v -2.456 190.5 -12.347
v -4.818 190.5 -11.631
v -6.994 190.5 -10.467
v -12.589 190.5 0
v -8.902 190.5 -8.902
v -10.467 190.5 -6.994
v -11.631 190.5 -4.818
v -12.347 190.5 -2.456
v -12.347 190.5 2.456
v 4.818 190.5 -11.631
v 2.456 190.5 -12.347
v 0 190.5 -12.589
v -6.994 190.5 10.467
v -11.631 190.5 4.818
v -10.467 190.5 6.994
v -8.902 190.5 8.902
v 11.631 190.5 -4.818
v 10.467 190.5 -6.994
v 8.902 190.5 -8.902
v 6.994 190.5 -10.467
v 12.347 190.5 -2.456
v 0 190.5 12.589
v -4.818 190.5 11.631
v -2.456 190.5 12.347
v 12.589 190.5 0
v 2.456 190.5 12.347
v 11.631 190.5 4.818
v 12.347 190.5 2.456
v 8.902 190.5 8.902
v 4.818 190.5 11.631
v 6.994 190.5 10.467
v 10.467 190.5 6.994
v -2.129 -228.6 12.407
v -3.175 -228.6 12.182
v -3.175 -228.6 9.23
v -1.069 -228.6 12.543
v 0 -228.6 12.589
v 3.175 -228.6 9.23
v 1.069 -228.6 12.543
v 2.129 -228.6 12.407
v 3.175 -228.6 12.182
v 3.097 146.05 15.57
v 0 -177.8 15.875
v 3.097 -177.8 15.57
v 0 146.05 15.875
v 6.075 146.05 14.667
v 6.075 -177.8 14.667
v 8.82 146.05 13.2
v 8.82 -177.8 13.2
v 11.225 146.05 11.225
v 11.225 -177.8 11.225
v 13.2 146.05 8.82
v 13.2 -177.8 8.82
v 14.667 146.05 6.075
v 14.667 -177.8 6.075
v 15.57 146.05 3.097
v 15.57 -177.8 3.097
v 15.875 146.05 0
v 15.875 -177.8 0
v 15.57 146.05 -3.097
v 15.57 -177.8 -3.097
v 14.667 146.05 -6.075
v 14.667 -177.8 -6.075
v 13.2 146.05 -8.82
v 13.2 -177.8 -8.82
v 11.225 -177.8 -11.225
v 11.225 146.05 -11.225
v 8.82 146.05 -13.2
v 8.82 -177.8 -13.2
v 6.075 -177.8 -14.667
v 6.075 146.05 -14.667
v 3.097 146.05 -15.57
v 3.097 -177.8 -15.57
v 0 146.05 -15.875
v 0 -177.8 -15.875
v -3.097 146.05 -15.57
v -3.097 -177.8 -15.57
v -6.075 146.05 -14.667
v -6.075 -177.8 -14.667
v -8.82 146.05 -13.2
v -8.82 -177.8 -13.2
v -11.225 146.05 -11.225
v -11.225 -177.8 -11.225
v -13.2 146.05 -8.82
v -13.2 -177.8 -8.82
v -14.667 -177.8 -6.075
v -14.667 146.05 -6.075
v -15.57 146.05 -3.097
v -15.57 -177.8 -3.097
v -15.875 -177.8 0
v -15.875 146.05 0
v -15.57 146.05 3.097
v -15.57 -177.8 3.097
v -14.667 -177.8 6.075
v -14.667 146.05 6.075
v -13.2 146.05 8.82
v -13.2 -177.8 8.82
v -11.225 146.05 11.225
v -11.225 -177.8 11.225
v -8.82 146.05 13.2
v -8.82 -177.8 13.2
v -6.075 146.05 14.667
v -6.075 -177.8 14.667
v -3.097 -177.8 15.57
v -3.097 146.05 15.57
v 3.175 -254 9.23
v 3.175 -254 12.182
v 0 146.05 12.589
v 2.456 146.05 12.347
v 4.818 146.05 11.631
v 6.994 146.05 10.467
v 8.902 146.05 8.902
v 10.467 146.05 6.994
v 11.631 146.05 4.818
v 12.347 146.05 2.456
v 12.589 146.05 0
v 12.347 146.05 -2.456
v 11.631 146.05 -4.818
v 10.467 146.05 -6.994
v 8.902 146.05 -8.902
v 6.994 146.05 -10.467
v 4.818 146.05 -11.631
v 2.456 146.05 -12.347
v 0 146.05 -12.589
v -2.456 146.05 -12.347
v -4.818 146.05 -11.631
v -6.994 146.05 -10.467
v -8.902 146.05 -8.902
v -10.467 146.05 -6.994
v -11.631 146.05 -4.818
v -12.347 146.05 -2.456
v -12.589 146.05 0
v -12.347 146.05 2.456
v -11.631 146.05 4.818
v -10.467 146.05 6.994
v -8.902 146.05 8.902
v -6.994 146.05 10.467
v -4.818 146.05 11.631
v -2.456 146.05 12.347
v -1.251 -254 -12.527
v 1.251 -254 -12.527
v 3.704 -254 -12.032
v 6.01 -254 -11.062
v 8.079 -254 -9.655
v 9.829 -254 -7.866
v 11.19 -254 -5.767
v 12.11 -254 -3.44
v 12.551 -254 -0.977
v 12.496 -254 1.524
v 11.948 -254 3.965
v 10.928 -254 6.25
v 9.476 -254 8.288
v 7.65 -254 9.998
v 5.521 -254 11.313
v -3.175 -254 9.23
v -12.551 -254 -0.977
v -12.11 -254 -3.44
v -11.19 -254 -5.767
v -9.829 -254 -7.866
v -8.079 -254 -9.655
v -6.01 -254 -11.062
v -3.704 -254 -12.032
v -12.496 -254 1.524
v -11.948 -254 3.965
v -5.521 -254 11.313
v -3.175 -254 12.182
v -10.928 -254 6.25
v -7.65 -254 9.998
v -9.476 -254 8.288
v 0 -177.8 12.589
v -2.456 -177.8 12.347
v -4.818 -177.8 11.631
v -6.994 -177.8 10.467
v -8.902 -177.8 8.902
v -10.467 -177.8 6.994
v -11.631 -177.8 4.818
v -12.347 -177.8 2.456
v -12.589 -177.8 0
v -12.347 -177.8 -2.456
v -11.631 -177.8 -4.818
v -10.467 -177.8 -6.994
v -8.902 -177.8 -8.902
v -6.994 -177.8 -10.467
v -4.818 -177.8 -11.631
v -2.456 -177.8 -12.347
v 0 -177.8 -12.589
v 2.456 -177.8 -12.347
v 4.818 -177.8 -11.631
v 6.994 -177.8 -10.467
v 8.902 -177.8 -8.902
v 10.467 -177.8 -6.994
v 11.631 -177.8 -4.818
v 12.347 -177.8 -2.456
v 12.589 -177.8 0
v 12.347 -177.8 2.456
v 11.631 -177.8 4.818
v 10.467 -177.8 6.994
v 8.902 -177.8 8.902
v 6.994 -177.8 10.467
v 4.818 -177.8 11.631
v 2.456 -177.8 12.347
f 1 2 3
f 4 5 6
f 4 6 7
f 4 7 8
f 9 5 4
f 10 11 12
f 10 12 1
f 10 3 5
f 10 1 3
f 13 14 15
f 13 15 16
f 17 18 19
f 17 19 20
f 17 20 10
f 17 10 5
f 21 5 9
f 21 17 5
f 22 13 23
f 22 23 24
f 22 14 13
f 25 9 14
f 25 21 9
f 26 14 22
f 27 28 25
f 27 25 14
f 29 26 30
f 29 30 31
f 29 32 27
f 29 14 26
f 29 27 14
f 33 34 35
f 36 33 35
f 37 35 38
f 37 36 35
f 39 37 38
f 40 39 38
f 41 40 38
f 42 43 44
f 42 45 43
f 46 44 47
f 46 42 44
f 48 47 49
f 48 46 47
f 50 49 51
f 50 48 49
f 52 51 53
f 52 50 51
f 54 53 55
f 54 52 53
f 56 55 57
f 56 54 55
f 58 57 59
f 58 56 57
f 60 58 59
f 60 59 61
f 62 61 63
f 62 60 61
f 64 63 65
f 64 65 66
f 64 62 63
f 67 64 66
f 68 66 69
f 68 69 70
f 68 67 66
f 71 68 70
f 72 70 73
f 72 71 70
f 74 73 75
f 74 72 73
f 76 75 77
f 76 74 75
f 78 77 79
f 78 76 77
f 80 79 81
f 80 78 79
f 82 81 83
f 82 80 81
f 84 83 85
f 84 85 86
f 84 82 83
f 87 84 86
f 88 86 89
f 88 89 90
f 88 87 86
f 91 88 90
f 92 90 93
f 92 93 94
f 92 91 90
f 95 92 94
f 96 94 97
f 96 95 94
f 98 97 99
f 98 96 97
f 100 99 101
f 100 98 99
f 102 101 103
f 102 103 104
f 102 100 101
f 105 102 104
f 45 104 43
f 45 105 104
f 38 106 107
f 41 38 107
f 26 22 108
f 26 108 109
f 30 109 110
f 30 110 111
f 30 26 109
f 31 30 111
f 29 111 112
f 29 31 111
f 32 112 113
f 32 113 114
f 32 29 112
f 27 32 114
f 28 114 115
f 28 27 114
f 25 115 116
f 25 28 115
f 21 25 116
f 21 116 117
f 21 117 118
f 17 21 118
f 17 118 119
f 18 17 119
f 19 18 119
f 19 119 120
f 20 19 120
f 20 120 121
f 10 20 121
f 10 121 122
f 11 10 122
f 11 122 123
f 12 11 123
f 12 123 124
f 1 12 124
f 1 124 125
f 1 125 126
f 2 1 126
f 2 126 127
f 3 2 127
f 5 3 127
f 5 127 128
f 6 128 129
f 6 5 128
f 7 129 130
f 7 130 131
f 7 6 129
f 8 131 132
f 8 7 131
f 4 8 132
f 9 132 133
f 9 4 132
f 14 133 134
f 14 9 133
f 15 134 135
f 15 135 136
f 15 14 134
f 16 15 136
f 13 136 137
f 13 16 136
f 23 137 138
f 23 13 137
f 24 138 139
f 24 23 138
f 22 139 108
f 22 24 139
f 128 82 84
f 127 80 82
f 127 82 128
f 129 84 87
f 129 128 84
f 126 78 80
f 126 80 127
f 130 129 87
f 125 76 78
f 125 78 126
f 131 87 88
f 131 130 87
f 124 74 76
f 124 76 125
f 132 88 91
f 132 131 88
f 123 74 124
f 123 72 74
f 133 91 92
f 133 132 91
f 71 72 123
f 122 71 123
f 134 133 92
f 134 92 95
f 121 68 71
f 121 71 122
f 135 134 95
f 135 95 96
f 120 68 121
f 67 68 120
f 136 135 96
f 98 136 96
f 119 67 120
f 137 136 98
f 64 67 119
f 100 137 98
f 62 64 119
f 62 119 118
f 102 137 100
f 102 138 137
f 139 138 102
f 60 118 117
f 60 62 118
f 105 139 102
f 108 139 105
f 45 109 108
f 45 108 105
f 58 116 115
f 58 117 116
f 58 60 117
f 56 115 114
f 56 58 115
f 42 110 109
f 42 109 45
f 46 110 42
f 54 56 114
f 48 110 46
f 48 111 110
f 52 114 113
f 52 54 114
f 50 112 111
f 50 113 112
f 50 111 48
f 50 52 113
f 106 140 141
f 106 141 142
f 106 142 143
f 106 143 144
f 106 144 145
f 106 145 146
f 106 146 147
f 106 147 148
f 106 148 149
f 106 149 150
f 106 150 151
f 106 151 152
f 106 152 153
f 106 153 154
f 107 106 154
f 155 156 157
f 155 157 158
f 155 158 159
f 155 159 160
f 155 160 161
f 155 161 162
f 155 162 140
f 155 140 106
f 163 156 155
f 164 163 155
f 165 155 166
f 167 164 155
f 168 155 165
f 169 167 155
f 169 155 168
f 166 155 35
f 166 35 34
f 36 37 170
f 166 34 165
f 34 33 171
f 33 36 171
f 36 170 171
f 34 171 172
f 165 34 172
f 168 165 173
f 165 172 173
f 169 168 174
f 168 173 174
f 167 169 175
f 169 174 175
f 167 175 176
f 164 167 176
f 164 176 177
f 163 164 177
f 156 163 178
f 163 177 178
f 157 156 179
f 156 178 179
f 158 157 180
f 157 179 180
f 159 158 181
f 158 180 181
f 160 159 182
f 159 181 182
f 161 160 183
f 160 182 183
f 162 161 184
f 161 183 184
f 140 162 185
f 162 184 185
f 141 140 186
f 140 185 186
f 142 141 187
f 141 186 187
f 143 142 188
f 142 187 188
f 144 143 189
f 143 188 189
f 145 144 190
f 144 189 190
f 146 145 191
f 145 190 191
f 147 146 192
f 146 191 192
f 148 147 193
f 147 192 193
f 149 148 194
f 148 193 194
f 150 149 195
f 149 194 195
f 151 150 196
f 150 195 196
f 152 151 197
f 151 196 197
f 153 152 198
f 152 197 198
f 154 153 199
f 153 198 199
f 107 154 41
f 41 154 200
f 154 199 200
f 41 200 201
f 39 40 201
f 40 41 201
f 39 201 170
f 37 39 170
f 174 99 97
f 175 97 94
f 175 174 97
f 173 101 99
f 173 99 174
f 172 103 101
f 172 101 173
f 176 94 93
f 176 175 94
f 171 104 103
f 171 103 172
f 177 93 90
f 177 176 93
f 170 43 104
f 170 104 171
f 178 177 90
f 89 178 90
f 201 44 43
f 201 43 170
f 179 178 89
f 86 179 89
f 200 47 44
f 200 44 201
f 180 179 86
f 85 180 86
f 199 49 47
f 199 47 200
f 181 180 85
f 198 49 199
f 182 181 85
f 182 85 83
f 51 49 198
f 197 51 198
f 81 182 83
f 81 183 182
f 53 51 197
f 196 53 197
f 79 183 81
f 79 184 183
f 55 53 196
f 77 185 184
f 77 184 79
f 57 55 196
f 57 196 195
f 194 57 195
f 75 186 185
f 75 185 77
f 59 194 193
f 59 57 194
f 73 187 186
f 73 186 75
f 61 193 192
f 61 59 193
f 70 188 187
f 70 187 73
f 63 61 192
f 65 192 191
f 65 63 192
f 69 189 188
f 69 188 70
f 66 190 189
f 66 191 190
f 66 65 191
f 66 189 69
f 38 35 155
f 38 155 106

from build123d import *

# Parameters (mm, degrees)
SKETCH1_R           = 15.875
BOSS_EXTRUDE1_DEPTH = 215.9
SKETCH4_R           = 15.875
SKETCH4_R_2         = 12.588875
CUT_EXTRUDE3_DEPTH  = 69.85
CUT_EXTRUDE4_START  = -38.1
SKETCH5_R           = 15.875
SKETCH5_R_2         = 12.588875
CUT_EXTRUDE4_DEPTH  = 38.1
SKETCH7_R           = 12.588875
BOSS_EXTRUDE2_DEPTH = 38.1
SKETCH8_W           = 6.35
SKETCH8_H           = 6.477
CUT_EXTRUDE5_DEPTH  = 25.4
SKETCH9_R           = 12.588875
CUT_EXTRUDE6_DEPTH  = 25.4


with BuildPart() as part:
    # Sketch1 → Boss-Extrude1 (new, symmetric)
    with BuildSketch(Plane(origin=(0, 0, 0), x_dir=(1, 0, 0), z_dir=(0, 1, 0))):
        with Locations(Location((0, 0, 0), (0, 0, 270))):
            Circle(SKETCH1_R)
    extrude(amount=BOSS_EXTRUDE1_DEPTH, both=True)

    # Sketch4 → Cut-Extrude3 (cut)
    with BuildSketch(Plane(origin=(0, 215.9, 0), x_dir=(1, 0, 0), z_dir=(0, 1, 0))):
        with Locations(Location((0, 0, 0), (0, 0, 270))):
            Circle(SKETCH4_R)
        with Locations(Location((0, 0, 0), (0, 0, 270))):
            Circle(SKETCH4_R_2, mode=Mode.SUBTRACT)
    extrude(amount=-CUT_EXTRUDE3_DEPTH, mode=Mode.SUBTRACT)

    # Sketch5 → Cut-Extrude4 (cut)
    with BuildSketch(Plane.XZ.offset(215.9).offset(CUT_EXTRUDE4_START)):
        with Locations(Location((0, 0, 0), (0, 0, 270))):
            Circle(SKETCH5_R)
        with Locations(Location((0, 0, 0), (0, 0, 90))):
            Circle(SKETCH5_R_2, mode=Mode.SUBTRACT)
    extrude(amount=CUT_EXTRUDE4_DEPTH, mode=Mode.SUBTRACT)

    # Sketch7 → Boss-Extrude2 (add)
    with BuildSketch(Plane.XZ.offset(215.9)):
        with Locations(Location((0, 0, 0), (0, 0, 90))):
            Circle(SKETCH7_R)
    extrude(amount=BOSS_EXTRUDE2_DEPTH)

    # Sketch8 → Cut-Extrude5 (cut)
    with BuildSketch(Plane.XZ.offset(254)):
        with Locations((0, 12.468225)):
            Rectangle(SKETCH8_W, SKETCH8_H)
    extrude(amount=-CUT_EXTRUDE5_DEPTH, mode=Mode.SUBTRACT)

    # Sketch9 → Cut-Extrude6 (cut)
    with BuildSketch(Plane(origin=(0, 215.9, 0), x_dir=(1, 0, 0), z_dir=(0, 1, 0))):
        with Locations(Location((0, 0, 0), (0, 0, 270))):
            Circle(SKETCH9_R)
    extrude(amount=-CUT_EXTRUDE6_DEPTH, mode=Mode.SUBTRACT)


solid = part.part
